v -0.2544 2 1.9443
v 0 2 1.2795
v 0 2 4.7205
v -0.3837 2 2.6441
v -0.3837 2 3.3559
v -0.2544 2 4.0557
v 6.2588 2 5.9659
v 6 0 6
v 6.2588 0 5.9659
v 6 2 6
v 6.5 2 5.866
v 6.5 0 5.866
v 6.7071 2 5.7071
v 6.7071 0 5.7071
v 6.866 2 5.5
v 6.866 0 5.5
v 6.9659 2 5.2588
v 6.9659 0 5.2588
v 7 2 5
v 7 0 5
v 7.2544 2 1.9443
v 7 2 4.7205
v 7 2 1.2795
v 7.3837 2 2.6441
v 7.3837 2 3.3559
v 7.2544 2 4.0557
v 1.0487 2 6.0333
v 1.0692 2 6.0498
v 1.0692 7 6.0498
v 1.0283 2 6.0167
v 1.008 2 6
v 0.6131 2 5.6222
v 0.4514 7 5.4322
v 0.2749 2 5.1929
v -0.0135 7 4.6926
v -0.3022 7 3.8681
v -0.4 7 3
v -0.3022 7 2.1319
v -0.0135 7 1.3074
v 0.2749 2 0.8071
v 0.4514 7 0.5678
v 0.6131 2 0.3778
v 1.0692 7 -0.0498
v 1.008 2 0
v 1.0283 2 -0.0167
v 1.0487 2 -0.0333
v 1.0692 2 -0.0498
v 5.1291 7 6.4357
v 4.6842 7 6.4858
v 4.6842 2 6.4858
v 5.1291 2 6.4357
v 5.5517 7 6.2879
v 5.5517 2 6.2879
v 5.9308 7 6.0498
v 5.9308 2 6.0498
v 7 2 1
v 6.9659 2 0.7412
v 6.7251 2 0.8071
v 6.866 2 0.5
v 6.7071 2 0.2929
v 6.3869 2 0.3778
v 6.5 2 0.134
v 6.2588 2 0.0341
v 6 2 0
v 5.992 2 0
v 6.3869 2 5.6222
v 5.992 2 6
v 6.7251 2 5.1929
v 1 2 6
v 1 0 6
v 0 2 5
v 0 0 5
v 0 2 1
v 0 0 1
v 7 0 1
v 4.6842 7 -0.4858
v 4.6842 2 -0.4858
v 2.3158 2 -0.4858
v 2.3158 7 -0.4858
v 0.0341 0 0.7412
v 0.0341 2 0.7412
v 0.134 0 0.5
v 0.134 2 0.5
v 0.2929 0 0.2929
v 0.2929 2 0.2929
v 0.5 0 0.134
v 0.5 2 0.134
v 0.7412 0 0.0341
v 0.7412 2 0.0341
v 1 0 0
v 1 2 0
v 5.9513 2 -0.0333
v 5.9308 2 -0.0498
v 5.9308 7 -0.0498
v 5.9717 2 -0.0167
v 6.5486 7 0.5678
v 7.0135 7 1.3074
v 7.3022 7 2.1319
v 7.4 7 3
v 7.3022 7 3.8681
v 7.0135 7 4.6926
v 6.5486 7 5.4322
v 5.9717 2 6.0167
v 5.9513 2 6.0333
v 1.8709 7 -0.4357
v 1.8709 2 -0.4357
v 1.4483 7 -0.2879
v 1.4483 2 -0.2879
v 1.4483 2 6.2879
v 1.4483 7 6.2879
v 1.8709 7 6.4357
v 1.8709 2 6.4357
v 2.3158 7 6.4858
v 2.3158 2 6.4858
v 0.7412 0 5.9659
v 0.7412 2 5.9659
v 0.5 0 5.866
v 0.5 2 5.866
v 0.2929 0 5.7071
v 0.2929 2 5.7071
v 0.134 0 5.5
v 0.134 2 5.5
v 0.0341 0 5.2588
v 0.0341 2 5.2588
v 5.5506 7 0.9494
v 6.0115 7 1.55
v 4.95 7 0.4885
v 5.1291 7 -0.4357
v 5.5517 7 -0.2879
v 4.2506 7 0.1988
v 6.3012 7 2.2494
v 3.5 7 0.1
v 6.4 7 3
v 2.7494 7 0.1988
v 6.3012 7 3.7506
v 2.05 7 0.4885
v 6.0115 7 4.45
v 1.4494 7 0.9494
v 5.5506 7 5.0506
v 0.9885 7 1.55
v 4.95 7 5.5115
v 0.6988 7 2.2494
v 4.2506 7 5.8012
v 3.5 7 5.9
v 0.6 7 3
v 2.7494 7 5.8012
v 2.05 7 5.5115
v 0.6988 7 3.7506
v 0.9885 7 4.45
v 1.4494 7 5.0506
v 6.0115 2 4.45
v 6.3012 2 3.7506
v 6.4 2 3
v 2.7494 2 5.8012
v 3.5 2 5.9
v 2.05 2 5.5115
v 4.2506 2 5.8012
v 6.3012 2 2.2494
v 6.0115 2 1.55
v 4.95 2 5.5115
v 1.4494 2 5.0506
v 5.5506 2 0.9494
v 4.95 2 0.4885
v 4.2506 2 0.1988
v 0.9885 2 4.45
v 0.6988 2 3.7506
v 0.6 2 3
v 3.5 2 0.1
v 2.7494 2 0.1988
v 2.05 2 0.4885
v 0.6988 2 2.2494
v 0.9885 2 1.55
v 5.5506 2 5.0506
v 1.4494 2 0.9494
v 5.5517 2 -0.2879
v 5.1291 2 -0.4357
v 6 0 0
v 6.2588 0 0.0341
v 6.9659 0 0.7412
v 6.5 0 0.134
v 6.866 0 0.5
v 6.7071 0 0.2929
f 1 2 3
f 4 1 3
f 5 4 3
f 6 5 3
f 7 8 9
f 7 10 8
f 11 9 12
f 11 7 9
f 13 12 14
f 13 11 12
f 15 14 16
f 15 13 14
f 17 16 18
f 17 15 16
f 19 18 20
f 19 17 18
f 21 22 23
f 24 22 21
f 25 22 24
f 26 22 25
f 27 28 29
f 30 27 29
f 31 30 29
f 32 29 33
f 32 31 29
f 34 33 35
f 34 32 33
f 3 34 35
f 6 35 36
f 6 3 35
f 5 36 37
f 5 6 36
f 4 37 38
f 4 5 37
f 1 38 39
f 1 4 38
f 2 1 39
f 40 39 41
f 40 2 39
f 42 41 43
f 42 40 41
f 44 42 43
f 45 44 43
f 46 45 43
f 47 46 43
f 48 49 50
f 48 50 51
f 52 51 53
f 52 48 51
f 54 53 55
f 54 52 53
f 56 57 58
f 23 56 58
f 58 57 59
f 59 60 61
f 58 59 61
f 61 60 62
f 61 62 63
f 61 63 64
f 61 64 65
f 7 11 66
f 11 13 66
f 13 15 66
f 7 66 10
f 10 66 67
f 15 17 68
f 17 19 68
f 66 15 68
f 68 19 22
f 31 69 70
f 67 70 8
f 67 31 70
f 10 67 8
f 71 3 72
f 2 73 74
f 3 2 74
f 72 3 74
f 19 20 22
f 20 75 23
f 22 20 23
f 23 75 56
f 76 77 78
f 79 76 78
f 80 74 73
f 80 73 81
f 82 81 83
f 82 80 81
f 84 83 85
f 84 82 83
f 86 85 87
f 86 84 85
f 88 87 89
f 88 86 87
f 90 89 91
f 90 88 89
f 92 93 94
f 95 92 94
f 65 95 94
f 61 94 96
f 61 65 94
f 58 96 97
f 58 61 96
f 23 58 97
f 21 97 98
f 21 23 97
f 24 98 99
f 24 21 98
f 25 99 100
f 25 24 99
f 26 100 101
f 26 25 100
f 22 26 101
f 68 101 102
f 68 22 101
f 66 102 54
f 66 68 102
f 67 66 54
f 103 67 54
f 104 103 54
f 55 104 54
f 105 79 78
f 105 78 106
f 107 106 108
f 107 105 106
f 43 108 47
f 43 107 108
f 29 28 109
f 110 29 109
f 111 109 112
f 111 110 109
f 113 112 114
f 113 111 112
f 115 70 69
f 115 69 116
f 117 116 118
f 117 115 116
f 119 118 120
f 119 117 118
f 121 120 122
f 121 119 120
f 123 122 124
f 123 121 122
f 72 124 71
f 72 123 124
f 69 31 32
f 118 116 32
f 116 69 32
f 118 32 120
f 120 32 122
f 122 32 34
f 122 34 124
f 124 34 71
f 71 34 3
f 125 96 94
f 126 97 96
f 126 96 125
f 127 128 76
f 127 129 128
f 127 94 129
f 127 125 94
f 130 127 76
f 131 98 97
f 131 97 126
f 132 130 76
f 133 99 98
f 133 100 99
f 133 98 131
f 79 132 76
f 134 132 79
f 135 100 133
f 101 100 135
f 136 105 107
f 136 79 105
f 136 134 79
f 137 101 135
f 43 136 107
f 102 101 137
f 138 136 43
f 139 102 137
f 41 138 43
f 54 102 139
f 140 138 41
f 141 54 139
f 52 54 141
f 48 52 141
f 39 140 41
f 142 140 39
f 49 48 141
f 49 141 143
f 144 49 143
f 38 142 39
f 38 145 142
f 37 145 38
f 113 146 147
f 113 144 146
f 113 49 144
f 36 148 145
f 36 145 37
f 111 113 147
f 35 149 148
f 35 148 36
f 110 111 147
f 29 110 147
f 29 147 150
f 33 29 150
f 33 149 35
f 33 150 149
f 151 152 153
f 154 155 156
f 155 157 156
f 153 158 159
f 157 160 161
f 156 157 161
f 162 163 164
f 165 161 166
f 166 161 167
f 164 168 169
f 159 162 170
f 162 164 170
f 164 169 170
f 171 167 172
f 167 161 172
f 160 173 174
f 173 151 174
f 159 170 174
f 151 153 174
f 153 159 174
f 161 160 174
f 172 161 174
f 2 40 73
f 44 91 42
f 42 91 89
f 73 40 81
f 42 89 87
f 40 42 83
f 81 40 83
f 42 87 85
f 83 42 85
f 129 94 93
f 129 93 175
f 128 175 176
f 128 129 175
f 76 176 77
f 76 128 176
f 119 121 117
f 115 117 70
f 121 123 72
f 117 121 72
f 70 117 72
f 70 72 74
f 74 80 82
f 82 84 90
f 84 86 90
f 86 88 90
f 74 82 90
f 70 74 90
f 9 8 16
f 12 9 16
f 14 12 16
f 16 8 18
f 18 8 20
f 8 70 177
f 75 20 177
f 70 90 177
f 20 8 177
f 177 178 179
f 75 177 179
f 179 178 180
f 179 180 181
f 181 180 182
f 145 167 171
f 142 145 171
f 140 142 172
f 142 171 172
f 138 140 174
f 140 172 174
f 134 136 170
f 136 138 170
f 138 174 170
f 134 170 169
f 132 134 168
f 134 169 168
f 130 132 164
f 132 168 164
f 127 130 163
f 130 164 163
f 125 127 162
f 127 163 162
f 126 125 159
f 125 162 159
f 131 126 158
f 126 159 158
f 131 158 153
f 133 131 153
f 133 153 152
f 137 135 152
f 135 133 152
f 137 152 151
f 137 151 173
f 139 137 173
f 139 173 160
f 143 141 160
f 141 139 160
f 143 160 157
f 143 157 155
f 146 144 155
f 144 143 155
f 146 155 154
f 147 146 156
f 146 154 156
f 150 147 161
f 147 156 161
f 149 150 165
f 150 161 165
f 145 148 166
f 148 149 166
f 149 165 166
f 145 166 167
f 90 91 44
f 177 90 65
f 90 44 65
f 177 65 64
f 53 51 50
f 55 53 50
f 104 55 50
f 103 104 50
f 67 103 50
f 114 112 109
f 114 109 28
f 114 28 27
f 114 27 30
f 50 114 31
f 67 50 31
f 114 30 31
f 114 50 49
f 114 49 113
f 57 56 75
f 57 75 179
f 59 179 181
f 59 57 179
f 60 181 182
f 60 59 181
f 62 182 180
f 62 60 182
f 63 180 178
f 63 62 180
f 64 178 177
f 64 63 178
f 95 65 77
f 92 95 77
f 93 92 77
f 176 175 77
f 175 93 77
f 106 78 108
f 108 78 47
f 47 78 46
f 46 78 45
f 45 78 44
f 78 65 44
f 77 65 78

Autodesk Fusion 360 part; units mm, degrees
sketch "Sketch1" plane through (0, 0, 0) normal (0, 0, 1) x (1, 0, 0)
  line L0 (0, 0) -> (7, 0)
  line L1 (7, 0) -> (7, 2)
  line L2 (7, 2) -> (0, 2)
  line L3 (0, 2) -> (0, 0)
  dimension "d1" = 7
  dimension "d2" = 2
extrude "Extrude1" add sketch "Sketch1" along normal blind 6
sketch "Sketch2" plane through (0, 2, 0) normal (0, 1, 0) x (-1, 0, 0)
  line L0 (-7, 0) -> (0, 0)
  line L1 (0, 0) -> (0, 6)
  line L2 (0, 6) -> (-7, 6)
  line L3 (-7, 6) -> (-7, 0)
  line L4 (-7, 3) -> (0, 3) construction
  line L5 (-3.5, 6) -> (-3.5, 0) construction
  circle A0 centre (-3.5, 3) radius 2.9
  circle A1 centre (-3.5, 3) radius 3.9
  line L6 (-5.2491, -0.4858) -> (-1.7509, -0.4858)
  line L7 (-5.2491, 6.4858) -> (-1.7509, 6.4858)
  dimension "d5" = 5.8
  dimension "d6" = 1
extrude "Extrude2" add sketch "Sketch2" along normal blind 5 contours L0 L1 L2 L3 A1 | L0 A1 L6 | L3 A1 | L1 A1 | L2 A1 L7
fillet "Fillet1" radius 1 4 edges at (0, 1, 6) (0, 1, 0) (7, 1, 0) (7, 1, 6)
fillet "Fillet2" radius 2 4 edges at (1.7509, 4.5, 6.4858) (5.2491, 4.5, 6.4858) (5.2491, 4.5, -0.4858) (1.7509, 4.5, -0.4858)
